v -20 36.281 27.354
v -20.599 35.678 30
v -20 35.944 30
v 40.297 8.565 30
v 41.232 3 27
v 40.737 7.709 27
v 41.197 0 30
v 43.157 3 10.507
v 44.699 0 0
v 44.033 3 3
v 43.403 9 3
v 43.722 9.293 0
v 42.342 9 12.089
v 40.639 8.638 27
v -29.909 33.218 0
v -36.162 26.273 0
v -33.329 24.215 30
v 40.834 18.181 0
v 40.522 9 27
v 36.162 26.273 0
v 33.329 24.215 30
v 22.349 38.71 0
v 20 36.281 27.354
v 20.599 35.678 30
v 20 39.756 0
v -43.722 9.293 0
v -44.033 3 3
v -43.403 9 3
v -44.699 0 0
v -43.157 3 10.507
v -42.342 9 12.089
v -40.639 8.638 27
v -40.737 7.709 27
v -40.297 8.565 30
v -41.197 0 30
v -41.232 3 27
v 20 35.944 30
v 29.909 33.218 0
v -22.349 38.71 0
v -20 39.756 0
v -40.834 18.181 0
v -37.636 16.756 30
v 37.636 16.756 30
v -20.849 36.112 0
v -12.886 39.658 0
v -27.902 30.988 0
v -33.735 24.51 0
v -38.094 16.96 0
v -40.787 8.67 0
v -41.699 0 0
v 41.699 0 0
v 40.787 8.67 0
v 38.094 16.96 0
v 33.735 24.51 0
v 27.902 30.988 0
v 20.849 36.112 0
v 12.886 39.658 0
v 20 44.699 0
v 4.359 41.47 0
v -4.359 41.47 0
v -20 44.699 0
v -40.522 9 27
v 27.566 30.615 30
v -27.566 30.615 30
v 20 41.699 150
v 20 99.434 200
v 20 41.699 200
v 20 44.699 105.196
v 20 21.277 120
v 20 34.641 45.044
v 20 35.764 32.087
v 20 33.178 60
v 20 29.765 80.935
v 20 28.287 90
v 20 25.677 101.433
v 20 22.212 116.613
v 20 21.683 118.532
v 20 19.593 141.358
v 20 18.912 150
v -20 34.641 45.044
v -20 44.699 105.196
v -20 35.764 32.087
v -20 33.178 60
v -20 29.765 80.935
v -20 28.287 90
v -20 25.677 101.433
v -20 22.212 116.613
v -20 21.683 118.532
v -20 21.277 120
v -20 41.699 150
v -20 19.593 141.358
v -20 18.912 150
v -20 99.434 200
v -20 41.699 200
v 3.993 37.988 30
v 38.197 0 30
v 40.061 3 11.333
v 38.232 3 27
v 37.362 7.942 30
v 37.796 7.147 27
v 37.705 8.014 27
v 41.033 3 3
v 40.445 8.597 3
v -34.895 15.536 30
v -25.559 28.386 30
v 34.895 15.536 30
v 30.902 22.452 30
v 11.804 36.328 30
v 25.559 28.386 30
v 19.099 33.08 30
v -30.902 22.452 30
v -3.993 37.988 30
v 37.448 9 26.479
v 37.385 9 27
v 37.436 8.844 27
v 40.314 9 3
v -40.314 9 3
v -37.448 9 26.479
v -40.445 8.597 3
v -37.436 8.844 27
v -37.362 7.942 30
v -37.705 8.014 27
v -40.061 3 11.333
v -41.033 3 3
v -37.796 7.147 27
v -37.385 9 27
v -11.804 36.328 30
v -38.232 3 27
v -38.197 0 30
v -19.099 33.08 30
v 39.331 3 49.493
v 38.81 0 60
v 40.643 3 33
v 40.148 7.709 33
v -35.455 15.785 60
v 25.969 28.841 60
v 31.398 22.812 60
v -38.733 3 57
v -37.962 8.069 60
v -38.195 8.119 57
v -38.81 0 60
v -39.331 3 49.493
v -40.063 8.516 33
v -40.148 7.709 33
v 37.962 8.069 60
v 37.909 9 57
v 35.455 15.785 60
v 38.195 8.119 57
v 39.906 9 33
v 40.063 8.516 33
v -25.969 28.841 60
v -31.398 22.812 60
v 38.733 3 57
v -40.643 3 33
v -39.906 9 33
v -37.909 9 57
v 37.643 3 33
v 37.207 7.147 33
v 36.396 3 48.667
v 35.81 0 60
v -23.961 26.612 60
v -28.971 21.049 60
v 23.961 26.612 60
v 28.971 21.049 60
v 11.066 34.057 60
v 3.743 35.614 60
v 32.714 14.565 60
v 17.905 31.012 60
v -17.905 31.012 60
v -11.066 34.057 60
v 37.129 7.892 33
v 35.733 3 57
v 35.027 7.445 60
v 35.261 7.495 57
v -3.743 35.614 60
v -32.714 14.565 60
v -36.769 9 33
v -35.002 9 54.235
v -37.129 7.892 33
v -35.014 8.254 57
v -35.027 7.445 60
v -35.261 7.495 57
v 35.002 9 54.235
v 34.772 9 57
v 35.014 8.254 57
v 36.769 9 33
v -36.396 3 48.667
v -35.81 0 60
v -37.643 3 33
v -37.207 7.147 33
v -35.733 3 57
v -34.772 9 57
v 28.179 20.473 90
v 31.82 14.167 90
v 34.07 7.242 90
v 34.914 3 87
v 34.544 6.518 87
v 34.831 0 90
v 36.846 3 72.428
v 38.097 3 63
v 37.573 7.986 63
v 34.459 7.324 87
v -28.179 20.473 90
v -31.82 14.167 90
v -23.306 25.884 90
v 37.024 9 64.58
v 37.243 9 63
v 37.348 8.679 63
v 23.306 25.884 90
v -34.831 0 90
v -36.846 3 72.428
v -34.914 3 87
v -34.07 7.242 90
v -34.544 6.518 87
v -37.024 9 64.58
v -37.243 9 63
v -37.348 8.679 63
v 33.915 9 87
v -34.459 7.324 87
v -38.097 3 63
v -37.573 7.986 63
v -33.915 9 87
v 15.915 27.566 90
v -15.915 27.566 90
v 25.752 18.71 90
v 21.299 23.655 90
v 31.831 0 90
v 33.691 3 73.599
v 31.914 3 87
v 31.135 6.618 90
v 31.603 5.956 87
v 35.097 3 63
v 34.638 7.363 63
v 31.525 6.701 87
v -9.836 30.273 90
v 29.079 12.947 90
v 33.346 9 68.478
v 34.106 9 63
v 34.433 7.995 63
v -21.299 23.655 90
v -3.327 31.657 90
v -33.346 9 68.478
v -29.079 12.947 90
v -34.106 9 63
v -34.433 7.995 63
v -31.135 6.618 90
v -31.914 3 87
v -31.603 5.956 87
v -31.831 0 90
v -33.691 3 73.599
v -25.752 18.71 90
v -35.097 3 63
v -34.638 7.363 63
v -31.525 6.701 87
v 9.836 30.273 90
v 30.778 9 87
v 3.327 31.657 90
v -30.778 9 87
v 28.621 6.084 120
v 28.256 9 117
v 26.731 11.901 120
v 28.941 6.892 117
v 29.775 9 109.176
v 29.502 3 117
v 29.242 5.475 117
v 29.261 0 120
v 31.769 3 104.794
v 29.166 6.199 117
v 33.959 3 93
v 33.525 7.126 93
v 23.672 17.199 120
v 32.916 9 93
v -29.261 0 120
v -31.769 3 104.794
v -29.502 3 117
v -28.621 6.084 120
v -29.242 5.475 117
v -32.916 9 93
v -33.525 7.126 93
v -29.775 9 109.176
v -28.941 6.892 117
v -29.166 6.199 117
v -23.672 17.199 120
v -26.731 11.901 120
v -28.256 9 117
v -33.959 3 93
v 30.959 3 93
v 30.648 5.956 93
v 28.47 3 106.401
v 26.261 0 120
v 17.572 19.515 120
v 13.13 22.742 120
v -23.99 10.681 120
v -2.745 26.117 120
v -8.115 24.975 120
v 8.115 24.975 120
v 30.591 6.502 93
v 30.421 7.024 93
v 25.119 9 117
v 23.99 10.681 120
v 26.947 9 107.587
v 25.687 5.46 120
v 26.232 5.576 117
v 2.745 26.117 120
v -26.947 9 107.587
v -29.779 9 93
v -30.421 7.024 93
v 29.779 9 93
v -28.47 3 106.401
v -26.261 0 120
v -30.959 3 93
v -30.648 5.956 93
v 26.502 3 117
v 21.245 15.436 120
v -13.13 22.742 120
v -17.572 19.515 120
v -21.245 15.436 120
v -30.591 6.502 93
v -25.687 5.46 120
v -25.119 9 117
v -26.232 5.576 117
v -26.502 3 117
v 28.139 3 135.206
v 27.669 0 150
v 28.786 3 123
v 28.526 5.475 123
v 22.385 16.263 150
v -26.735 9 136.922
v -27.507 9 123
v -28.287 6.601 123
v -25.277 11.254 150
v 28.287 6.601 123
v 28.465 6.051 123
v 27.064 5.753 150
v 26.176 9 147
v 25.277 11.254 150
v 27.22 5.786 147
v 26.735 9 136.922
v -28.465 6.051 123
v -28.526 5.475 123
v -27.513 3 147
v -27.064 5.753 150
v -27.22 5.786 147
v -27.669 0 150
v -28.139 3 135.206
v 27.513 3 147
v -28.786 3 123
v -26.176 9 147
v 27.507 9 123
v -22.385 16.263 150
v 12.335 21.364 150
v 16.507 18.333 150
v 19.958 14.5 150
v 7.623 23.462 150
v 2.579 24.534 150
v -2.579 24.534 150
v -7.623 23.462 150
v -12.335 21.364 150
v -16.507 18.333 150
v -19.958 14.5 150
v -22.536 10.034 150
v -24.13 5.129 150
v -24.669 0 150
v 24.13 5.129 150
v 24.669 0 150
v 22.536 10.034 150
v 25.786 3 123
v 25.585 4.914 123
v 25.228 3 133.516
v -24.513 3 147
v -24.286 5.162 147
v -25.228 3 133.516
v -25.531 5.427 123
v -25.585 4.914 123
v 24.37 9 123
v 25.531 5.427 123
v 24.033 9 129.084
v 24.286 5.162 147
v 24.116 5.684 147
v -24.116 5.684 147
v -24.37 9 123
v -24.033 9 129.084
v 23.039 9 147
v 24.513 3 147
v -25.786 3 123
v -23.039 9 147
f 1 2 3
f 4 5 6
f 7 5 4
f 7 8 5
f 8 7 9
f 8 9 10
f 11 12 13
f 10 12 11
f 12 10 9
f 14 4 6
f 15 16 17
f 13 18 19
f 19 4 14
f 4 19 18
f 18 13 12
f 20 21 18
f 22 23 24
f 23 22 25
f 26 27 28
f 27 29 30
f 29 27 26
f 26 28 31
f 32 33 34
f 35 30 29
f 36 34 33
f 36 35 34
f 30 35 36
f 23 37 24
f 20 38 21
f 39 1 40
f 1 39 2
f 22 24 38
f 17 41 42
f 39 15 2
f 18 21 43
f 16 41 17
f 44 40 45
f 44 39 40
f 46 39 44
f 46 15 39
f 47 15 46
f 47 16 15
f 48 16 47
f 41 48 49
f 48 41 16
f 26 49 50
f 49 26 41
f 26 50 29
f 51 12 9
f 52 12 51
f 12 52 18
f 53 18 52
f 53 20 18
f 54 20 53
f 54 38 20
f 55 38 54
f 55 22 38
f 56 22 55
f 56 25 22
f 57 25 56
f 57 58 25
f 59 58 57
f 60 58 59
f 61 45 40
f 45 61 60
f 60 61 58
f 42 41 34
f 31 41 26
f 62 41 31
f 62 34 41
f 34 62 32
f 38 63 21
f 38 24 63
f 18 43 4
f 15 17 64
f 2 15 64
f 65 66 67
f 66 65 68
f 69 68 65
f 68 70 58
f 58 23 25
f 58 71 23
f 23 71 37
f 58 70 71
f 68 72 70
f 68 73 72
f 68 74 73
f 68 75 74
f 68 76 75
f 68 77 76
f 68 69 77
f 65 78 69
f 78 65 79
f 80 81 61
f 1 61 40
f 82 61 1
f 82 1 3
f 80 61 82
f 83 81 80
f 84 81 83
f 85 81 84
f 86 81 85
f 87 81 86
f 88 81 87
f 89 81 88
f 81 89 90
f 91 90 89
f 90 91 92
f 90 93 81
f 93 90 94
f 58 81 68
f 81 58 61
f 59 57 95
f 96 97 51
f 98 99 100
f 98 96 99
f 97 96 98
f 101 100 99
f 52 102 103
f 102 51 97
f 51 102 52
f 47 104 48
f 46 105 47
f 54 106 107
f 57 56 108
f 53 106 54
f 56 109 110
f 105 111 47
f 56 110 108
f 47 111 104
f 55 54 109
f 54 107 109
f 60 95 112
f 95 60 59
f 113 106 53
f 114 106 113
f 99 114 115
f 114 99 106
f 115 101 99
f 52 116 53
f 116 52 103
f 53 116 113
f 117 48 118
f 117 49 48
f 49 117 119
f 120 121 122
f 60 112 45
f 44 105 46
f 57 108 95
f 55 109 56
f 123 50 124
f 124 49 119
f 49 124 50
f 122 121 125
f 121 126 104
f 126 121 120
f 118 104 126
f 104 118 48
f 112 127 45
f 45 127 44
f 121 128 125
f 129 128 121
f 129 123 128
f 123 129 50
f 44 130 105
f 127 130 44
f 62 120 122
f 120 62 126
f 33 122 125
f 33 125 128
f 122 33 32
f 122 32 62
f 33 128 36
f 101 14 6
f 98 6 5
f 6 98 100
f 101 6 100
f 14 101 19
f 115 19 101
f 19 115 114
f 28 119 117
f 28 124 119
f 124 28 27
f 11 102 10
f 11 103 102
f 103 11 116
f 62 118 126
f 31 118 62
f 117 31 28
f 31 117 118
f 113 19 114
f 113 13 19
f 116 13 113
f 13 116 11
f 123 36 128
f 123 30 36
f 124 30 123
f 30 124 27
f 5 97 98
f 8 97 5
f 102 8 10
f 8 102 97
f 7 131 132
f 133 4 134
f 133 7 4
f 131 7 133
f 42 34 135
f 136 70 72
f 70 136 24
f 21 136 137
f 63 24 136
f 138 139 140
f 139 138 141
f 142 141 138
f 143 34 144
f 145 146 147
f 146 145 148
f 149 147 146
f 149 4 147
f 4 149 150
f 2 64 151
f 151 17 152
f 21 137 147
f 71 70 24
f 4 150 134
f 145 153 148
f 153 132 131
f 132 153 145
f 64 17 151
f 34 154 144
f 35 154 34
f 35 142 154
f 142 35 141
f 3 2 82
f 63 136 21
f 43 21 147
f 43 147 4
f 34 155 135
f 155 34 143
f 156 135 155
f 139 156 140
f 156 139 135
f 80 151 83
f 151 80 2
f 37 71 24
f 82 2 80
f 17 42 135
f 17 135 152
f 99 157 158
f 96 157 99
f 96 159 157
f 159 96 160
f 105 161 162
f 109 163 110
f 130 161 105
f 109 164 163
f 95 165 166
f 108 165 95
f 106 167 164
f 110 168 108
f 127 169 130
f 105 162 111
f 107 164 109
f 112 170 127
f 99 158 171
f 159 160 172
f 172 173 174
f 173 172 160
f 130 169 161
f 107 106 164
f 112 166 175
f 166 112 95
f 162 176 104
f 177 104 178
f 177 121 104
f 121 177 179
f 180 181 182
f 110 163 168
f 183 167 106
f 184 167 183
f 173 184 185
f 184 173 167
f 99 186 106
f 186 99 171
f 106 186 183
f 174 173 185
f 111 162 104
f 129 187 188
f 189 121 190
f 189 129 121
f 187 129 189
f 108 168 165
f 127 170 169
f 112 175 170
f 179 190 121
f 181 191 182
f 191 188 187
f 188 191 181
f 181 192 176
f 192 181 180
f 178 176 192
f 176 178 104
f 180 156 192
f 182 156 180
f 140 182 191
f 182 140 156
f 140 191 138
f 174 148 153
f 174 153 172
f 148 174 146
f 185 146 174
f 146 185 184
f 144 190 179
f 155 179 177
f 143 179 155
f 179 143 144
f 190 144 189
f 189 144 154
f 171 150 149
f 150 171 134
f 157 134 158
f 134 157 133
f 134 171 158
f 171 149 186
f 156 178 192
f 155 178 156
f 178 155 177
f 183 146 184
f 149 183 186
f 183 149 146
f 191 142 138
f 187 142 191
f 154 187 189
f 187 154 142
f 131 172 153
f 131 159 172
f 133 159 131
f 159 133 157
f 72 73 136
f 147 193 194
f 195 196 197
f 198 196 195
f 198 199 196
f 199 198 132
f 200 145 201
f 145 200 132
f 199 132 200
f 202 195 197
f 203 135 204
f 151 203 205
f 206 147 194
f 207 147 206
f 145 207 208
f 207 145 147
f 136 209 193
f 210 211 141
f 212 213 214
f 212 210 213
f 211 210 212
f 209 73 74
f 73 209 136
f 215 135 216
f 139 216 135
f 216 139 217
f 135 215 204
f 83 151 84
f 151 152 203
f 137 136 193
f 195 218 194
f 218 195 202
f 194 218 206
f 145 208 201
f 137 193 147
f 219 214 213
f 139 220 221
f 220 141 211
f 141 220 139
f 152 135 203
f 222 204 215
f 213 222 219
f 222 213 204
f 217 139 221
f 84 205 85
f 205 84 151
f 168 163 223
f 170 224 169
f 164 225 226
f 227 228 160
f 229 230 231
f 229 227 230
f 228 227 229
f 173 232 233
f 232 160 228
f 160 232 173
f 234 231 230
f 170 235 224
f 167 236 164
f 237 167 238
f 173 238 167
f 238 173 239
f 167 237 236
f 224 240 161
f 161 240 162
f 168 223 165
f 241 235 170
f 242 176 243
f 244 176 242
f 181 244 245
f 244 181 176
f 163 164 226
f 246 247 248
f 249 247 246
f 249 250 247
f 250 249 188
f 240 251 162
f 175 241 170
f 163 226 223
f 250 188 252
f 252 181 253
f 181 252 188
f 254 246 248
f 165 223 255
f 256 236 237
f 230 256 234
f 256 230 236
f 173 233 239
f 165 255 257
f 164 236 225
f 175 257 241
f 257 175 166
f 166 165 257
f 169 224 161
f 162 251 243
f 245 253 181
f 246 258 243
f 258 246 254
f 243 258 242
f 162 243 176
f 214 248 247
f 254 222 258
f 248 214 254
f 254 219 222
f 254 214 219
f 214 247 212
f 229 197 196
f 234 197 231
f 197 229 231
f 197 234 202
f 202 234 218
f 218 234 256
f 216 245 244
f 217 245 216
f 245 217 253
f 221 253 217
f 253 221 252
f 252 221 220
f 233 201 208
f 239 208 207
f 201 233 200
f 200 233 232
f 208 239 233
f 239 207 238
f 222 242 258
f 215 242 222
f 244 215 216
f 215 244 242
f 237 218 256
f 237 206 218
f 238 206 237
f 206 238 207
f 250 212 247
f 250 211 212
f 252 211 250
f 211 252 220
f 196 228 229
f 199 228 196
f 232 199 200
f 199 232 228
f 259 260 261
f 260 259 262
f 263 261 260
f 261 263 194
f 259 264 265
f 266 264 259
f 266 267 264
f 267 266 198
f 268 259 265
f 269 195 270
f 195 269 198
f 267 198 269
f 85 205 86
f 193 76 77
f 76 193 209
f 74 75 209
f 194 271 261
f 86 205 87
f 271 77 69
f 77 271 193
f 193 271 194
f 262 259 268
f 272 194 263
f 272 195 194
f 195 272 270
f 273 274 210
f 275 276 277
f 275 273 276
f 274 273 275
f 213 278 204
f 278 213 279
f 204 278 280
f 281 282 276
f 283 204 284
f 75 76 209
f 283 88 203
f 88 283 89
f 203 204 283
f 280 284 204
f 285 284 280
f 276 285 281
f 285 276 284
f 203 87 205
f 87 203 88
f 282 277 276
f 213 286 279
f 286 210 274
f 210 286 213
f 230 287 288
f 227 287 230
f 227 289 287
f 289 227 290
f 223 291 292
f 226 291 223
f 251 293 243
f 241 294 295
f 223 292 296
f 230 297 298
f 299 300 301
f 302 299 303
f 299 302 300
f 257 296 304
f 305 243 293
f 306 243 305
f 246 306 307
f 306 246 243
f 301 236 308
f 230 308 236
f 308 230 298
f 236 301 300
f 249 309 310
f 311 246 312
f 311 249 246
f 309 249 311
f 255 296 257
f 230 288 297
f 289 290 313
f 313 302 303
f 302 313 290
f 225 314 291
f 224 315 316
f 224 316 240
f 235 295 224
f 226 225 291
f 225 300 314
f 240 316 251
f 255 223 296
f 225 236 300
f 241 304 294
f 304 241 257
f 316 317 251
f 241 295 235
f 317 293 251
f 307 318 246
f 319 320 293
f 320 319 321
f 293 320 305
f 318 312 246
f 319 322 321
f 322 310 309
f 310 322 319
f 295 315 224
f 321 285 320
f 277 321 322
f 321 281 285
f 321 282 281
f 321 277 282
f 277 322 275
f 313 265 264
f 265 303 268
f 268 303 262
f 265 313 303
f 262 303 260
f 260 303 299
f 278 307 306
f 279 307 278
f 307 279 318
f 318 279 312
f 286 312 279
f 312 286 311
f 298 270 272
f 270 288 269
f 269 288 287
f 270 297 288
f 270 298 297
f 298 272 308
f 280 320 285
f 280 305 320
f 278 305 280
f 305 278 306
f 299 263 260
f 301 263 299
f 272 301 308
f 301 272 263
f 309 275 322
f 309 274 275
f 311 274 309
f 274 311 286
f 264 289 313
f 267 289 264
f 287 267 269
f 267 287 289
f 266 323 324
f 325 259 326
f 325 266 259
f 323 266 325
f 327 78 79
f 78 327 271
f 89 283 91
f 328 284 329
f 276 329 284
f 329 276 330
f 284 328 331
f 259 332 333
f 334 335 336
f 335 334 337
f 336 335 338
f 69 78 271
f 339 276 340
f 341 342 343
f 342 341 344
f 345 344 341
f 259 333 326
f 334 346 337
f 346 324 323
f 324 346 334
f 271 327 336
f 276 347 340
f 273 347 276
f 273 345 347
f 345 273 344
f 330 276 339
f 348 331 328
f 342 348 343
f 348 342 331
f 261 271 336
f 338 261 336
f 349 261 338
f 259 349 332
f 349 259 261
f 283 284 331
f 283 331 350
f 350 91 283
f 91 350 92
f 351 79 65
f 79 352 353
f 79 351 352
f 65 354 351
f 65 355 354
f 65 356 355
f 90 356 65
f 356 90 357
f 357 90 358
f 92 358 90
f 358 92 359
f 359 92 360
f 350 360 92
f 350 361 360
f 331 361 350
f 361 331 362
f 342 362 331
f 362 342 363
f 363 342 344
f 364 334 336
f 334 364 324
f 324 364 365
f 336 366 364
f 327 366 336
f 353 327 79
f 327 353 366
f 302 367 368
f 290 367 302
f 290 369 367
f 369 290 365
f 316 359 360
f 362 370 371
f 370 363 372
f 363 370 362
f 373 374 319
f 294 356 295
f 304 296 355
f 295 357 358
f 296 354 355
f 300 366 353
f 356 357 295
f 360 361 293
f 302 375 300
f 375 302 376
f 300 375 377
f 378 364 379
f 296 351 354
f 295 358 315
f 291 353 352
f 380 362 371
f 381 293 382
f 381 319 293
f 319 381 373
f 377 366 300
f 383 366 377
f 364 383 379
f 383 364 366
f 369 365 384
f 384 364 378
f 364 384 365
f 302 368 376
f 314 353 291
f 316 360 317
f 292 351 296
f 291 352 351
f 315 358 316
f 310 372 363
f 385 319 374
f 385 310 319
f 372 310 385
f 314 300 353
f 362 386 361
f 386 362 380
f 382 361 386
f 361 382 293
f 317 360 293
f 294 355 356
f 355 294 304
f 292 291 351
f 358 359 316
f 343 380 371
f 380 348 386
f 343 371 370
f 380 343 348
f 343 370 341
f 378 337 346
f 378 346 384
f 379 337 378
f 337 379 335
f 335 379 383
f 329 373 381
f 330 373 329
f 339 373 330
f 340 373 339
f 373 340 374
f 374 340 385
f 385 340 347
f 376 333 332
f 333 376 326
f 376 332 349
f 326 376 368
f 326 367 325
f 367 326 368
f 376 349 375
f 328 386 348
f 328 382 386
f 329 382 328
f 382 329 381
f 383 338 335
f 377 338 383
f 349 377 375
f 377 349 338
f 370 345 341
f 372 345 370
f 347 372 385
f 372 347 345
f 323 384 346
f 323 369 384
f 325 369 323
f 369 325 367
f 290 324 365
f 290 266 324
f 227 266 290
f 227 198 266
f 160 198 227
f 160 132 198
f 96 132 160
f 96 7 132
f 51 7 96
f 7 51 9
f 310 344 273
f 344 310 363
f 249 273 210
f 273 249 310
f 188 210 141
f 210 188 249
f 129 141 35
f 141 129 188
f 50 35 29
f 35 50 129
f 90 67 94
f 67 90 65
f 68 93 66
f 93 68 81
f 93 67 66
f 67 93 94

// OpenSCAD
union()  {
difference()  {
union()  {
translate([0.0,0.0,0.0])difference()  {
union()  {
cylinder(r1=44.69859509007658,r2=41.197186342054884,h=30.0);
translate([-20.0,0.0,0.0])cube([40.0,44.69859509007658,30.0]);
}
cylinder(r1=41.69859509007658,r2=38.197186342054884,h=30.0);
translate([-44.69859509007658,3.0,3.0])cube([89.39719018015316,6.0,24.0]);
}
translate([0.0,0.0,30.0])difference()  {
union()  {
cylinder(r1=41.197186342054884,r2=38.80986219567645,h=30.0);
translate([-20.0,0.0,0.0])cube([40.0,44.69859509007658,30.0]);
}
cylinder(r1=38.197186342054884,r2=35.80986219567645,h=30.0);
translate([-44.69859509007658,3.0,3.0])cube([89.39719018015316,6.0,24.0]);
}
translate([0.0,0.0,60.0])difference()  {
union()  {
cylinder(r1=38.80986219567645,r2=34.83098861837907,h=30.0);
translate([-20.0,0.0,0.0])cube([40.0,44.69859509007658,30.0]);
}
cylinder(r1=35.80986219567645,r2=31.830988618379067,h=30.0);
translate([-44.69859509007658,3.0,3.0])cube([89.39719018015316,6.0,24.0]);
}
translate([0.0,0.0,90.0])difference()  {
union()  {
cylinder(r1=34.83098861837907,r2=29.26056561016273,h=30.0);
translate([-20.0,0.0,0.0])cube([40.0,44.69859509007658,30.0]);
}
cylinder(r1=31.830988618379067,r2=26.260565610162732,h=30.0);
translate([-44.69859509007658,3.0,3.0])cube([89.39719018015316,6.0,24.0]);
}
translate([0.0,0.0,120.0])difference()  {
union()  {
cylinder(r1=29.26056561016273,r2=27.669016179243776,h=30.0);
translate([-20.0,0.0,0.0])cube([40.0,44.69859509007658,30.0]);
}
cylinder(r1=26.260565610162732,r2=24.669016179243776,h=30.0);
translate([-44.69859509007658,3.0,3.0])cube([89.39719018015316,6.0,24.0]);
}
}
translate([-44.69859509007658,-44.69859509007658,0.0])cube([89.39719018015316,44.69859509007658,180.0]);
}
translate([-20.0,41.69859509007658,200.0])scale([1.0,1.0,1.0])rotate([0.0,0.0,0.0])  rotate([90.0,90.0,90.0])  linear_extrude(height =40.0)  polygon(
points = [[0.0,0.0],[100.0,0.0],[0.0,57.735026918962575]]);
}
